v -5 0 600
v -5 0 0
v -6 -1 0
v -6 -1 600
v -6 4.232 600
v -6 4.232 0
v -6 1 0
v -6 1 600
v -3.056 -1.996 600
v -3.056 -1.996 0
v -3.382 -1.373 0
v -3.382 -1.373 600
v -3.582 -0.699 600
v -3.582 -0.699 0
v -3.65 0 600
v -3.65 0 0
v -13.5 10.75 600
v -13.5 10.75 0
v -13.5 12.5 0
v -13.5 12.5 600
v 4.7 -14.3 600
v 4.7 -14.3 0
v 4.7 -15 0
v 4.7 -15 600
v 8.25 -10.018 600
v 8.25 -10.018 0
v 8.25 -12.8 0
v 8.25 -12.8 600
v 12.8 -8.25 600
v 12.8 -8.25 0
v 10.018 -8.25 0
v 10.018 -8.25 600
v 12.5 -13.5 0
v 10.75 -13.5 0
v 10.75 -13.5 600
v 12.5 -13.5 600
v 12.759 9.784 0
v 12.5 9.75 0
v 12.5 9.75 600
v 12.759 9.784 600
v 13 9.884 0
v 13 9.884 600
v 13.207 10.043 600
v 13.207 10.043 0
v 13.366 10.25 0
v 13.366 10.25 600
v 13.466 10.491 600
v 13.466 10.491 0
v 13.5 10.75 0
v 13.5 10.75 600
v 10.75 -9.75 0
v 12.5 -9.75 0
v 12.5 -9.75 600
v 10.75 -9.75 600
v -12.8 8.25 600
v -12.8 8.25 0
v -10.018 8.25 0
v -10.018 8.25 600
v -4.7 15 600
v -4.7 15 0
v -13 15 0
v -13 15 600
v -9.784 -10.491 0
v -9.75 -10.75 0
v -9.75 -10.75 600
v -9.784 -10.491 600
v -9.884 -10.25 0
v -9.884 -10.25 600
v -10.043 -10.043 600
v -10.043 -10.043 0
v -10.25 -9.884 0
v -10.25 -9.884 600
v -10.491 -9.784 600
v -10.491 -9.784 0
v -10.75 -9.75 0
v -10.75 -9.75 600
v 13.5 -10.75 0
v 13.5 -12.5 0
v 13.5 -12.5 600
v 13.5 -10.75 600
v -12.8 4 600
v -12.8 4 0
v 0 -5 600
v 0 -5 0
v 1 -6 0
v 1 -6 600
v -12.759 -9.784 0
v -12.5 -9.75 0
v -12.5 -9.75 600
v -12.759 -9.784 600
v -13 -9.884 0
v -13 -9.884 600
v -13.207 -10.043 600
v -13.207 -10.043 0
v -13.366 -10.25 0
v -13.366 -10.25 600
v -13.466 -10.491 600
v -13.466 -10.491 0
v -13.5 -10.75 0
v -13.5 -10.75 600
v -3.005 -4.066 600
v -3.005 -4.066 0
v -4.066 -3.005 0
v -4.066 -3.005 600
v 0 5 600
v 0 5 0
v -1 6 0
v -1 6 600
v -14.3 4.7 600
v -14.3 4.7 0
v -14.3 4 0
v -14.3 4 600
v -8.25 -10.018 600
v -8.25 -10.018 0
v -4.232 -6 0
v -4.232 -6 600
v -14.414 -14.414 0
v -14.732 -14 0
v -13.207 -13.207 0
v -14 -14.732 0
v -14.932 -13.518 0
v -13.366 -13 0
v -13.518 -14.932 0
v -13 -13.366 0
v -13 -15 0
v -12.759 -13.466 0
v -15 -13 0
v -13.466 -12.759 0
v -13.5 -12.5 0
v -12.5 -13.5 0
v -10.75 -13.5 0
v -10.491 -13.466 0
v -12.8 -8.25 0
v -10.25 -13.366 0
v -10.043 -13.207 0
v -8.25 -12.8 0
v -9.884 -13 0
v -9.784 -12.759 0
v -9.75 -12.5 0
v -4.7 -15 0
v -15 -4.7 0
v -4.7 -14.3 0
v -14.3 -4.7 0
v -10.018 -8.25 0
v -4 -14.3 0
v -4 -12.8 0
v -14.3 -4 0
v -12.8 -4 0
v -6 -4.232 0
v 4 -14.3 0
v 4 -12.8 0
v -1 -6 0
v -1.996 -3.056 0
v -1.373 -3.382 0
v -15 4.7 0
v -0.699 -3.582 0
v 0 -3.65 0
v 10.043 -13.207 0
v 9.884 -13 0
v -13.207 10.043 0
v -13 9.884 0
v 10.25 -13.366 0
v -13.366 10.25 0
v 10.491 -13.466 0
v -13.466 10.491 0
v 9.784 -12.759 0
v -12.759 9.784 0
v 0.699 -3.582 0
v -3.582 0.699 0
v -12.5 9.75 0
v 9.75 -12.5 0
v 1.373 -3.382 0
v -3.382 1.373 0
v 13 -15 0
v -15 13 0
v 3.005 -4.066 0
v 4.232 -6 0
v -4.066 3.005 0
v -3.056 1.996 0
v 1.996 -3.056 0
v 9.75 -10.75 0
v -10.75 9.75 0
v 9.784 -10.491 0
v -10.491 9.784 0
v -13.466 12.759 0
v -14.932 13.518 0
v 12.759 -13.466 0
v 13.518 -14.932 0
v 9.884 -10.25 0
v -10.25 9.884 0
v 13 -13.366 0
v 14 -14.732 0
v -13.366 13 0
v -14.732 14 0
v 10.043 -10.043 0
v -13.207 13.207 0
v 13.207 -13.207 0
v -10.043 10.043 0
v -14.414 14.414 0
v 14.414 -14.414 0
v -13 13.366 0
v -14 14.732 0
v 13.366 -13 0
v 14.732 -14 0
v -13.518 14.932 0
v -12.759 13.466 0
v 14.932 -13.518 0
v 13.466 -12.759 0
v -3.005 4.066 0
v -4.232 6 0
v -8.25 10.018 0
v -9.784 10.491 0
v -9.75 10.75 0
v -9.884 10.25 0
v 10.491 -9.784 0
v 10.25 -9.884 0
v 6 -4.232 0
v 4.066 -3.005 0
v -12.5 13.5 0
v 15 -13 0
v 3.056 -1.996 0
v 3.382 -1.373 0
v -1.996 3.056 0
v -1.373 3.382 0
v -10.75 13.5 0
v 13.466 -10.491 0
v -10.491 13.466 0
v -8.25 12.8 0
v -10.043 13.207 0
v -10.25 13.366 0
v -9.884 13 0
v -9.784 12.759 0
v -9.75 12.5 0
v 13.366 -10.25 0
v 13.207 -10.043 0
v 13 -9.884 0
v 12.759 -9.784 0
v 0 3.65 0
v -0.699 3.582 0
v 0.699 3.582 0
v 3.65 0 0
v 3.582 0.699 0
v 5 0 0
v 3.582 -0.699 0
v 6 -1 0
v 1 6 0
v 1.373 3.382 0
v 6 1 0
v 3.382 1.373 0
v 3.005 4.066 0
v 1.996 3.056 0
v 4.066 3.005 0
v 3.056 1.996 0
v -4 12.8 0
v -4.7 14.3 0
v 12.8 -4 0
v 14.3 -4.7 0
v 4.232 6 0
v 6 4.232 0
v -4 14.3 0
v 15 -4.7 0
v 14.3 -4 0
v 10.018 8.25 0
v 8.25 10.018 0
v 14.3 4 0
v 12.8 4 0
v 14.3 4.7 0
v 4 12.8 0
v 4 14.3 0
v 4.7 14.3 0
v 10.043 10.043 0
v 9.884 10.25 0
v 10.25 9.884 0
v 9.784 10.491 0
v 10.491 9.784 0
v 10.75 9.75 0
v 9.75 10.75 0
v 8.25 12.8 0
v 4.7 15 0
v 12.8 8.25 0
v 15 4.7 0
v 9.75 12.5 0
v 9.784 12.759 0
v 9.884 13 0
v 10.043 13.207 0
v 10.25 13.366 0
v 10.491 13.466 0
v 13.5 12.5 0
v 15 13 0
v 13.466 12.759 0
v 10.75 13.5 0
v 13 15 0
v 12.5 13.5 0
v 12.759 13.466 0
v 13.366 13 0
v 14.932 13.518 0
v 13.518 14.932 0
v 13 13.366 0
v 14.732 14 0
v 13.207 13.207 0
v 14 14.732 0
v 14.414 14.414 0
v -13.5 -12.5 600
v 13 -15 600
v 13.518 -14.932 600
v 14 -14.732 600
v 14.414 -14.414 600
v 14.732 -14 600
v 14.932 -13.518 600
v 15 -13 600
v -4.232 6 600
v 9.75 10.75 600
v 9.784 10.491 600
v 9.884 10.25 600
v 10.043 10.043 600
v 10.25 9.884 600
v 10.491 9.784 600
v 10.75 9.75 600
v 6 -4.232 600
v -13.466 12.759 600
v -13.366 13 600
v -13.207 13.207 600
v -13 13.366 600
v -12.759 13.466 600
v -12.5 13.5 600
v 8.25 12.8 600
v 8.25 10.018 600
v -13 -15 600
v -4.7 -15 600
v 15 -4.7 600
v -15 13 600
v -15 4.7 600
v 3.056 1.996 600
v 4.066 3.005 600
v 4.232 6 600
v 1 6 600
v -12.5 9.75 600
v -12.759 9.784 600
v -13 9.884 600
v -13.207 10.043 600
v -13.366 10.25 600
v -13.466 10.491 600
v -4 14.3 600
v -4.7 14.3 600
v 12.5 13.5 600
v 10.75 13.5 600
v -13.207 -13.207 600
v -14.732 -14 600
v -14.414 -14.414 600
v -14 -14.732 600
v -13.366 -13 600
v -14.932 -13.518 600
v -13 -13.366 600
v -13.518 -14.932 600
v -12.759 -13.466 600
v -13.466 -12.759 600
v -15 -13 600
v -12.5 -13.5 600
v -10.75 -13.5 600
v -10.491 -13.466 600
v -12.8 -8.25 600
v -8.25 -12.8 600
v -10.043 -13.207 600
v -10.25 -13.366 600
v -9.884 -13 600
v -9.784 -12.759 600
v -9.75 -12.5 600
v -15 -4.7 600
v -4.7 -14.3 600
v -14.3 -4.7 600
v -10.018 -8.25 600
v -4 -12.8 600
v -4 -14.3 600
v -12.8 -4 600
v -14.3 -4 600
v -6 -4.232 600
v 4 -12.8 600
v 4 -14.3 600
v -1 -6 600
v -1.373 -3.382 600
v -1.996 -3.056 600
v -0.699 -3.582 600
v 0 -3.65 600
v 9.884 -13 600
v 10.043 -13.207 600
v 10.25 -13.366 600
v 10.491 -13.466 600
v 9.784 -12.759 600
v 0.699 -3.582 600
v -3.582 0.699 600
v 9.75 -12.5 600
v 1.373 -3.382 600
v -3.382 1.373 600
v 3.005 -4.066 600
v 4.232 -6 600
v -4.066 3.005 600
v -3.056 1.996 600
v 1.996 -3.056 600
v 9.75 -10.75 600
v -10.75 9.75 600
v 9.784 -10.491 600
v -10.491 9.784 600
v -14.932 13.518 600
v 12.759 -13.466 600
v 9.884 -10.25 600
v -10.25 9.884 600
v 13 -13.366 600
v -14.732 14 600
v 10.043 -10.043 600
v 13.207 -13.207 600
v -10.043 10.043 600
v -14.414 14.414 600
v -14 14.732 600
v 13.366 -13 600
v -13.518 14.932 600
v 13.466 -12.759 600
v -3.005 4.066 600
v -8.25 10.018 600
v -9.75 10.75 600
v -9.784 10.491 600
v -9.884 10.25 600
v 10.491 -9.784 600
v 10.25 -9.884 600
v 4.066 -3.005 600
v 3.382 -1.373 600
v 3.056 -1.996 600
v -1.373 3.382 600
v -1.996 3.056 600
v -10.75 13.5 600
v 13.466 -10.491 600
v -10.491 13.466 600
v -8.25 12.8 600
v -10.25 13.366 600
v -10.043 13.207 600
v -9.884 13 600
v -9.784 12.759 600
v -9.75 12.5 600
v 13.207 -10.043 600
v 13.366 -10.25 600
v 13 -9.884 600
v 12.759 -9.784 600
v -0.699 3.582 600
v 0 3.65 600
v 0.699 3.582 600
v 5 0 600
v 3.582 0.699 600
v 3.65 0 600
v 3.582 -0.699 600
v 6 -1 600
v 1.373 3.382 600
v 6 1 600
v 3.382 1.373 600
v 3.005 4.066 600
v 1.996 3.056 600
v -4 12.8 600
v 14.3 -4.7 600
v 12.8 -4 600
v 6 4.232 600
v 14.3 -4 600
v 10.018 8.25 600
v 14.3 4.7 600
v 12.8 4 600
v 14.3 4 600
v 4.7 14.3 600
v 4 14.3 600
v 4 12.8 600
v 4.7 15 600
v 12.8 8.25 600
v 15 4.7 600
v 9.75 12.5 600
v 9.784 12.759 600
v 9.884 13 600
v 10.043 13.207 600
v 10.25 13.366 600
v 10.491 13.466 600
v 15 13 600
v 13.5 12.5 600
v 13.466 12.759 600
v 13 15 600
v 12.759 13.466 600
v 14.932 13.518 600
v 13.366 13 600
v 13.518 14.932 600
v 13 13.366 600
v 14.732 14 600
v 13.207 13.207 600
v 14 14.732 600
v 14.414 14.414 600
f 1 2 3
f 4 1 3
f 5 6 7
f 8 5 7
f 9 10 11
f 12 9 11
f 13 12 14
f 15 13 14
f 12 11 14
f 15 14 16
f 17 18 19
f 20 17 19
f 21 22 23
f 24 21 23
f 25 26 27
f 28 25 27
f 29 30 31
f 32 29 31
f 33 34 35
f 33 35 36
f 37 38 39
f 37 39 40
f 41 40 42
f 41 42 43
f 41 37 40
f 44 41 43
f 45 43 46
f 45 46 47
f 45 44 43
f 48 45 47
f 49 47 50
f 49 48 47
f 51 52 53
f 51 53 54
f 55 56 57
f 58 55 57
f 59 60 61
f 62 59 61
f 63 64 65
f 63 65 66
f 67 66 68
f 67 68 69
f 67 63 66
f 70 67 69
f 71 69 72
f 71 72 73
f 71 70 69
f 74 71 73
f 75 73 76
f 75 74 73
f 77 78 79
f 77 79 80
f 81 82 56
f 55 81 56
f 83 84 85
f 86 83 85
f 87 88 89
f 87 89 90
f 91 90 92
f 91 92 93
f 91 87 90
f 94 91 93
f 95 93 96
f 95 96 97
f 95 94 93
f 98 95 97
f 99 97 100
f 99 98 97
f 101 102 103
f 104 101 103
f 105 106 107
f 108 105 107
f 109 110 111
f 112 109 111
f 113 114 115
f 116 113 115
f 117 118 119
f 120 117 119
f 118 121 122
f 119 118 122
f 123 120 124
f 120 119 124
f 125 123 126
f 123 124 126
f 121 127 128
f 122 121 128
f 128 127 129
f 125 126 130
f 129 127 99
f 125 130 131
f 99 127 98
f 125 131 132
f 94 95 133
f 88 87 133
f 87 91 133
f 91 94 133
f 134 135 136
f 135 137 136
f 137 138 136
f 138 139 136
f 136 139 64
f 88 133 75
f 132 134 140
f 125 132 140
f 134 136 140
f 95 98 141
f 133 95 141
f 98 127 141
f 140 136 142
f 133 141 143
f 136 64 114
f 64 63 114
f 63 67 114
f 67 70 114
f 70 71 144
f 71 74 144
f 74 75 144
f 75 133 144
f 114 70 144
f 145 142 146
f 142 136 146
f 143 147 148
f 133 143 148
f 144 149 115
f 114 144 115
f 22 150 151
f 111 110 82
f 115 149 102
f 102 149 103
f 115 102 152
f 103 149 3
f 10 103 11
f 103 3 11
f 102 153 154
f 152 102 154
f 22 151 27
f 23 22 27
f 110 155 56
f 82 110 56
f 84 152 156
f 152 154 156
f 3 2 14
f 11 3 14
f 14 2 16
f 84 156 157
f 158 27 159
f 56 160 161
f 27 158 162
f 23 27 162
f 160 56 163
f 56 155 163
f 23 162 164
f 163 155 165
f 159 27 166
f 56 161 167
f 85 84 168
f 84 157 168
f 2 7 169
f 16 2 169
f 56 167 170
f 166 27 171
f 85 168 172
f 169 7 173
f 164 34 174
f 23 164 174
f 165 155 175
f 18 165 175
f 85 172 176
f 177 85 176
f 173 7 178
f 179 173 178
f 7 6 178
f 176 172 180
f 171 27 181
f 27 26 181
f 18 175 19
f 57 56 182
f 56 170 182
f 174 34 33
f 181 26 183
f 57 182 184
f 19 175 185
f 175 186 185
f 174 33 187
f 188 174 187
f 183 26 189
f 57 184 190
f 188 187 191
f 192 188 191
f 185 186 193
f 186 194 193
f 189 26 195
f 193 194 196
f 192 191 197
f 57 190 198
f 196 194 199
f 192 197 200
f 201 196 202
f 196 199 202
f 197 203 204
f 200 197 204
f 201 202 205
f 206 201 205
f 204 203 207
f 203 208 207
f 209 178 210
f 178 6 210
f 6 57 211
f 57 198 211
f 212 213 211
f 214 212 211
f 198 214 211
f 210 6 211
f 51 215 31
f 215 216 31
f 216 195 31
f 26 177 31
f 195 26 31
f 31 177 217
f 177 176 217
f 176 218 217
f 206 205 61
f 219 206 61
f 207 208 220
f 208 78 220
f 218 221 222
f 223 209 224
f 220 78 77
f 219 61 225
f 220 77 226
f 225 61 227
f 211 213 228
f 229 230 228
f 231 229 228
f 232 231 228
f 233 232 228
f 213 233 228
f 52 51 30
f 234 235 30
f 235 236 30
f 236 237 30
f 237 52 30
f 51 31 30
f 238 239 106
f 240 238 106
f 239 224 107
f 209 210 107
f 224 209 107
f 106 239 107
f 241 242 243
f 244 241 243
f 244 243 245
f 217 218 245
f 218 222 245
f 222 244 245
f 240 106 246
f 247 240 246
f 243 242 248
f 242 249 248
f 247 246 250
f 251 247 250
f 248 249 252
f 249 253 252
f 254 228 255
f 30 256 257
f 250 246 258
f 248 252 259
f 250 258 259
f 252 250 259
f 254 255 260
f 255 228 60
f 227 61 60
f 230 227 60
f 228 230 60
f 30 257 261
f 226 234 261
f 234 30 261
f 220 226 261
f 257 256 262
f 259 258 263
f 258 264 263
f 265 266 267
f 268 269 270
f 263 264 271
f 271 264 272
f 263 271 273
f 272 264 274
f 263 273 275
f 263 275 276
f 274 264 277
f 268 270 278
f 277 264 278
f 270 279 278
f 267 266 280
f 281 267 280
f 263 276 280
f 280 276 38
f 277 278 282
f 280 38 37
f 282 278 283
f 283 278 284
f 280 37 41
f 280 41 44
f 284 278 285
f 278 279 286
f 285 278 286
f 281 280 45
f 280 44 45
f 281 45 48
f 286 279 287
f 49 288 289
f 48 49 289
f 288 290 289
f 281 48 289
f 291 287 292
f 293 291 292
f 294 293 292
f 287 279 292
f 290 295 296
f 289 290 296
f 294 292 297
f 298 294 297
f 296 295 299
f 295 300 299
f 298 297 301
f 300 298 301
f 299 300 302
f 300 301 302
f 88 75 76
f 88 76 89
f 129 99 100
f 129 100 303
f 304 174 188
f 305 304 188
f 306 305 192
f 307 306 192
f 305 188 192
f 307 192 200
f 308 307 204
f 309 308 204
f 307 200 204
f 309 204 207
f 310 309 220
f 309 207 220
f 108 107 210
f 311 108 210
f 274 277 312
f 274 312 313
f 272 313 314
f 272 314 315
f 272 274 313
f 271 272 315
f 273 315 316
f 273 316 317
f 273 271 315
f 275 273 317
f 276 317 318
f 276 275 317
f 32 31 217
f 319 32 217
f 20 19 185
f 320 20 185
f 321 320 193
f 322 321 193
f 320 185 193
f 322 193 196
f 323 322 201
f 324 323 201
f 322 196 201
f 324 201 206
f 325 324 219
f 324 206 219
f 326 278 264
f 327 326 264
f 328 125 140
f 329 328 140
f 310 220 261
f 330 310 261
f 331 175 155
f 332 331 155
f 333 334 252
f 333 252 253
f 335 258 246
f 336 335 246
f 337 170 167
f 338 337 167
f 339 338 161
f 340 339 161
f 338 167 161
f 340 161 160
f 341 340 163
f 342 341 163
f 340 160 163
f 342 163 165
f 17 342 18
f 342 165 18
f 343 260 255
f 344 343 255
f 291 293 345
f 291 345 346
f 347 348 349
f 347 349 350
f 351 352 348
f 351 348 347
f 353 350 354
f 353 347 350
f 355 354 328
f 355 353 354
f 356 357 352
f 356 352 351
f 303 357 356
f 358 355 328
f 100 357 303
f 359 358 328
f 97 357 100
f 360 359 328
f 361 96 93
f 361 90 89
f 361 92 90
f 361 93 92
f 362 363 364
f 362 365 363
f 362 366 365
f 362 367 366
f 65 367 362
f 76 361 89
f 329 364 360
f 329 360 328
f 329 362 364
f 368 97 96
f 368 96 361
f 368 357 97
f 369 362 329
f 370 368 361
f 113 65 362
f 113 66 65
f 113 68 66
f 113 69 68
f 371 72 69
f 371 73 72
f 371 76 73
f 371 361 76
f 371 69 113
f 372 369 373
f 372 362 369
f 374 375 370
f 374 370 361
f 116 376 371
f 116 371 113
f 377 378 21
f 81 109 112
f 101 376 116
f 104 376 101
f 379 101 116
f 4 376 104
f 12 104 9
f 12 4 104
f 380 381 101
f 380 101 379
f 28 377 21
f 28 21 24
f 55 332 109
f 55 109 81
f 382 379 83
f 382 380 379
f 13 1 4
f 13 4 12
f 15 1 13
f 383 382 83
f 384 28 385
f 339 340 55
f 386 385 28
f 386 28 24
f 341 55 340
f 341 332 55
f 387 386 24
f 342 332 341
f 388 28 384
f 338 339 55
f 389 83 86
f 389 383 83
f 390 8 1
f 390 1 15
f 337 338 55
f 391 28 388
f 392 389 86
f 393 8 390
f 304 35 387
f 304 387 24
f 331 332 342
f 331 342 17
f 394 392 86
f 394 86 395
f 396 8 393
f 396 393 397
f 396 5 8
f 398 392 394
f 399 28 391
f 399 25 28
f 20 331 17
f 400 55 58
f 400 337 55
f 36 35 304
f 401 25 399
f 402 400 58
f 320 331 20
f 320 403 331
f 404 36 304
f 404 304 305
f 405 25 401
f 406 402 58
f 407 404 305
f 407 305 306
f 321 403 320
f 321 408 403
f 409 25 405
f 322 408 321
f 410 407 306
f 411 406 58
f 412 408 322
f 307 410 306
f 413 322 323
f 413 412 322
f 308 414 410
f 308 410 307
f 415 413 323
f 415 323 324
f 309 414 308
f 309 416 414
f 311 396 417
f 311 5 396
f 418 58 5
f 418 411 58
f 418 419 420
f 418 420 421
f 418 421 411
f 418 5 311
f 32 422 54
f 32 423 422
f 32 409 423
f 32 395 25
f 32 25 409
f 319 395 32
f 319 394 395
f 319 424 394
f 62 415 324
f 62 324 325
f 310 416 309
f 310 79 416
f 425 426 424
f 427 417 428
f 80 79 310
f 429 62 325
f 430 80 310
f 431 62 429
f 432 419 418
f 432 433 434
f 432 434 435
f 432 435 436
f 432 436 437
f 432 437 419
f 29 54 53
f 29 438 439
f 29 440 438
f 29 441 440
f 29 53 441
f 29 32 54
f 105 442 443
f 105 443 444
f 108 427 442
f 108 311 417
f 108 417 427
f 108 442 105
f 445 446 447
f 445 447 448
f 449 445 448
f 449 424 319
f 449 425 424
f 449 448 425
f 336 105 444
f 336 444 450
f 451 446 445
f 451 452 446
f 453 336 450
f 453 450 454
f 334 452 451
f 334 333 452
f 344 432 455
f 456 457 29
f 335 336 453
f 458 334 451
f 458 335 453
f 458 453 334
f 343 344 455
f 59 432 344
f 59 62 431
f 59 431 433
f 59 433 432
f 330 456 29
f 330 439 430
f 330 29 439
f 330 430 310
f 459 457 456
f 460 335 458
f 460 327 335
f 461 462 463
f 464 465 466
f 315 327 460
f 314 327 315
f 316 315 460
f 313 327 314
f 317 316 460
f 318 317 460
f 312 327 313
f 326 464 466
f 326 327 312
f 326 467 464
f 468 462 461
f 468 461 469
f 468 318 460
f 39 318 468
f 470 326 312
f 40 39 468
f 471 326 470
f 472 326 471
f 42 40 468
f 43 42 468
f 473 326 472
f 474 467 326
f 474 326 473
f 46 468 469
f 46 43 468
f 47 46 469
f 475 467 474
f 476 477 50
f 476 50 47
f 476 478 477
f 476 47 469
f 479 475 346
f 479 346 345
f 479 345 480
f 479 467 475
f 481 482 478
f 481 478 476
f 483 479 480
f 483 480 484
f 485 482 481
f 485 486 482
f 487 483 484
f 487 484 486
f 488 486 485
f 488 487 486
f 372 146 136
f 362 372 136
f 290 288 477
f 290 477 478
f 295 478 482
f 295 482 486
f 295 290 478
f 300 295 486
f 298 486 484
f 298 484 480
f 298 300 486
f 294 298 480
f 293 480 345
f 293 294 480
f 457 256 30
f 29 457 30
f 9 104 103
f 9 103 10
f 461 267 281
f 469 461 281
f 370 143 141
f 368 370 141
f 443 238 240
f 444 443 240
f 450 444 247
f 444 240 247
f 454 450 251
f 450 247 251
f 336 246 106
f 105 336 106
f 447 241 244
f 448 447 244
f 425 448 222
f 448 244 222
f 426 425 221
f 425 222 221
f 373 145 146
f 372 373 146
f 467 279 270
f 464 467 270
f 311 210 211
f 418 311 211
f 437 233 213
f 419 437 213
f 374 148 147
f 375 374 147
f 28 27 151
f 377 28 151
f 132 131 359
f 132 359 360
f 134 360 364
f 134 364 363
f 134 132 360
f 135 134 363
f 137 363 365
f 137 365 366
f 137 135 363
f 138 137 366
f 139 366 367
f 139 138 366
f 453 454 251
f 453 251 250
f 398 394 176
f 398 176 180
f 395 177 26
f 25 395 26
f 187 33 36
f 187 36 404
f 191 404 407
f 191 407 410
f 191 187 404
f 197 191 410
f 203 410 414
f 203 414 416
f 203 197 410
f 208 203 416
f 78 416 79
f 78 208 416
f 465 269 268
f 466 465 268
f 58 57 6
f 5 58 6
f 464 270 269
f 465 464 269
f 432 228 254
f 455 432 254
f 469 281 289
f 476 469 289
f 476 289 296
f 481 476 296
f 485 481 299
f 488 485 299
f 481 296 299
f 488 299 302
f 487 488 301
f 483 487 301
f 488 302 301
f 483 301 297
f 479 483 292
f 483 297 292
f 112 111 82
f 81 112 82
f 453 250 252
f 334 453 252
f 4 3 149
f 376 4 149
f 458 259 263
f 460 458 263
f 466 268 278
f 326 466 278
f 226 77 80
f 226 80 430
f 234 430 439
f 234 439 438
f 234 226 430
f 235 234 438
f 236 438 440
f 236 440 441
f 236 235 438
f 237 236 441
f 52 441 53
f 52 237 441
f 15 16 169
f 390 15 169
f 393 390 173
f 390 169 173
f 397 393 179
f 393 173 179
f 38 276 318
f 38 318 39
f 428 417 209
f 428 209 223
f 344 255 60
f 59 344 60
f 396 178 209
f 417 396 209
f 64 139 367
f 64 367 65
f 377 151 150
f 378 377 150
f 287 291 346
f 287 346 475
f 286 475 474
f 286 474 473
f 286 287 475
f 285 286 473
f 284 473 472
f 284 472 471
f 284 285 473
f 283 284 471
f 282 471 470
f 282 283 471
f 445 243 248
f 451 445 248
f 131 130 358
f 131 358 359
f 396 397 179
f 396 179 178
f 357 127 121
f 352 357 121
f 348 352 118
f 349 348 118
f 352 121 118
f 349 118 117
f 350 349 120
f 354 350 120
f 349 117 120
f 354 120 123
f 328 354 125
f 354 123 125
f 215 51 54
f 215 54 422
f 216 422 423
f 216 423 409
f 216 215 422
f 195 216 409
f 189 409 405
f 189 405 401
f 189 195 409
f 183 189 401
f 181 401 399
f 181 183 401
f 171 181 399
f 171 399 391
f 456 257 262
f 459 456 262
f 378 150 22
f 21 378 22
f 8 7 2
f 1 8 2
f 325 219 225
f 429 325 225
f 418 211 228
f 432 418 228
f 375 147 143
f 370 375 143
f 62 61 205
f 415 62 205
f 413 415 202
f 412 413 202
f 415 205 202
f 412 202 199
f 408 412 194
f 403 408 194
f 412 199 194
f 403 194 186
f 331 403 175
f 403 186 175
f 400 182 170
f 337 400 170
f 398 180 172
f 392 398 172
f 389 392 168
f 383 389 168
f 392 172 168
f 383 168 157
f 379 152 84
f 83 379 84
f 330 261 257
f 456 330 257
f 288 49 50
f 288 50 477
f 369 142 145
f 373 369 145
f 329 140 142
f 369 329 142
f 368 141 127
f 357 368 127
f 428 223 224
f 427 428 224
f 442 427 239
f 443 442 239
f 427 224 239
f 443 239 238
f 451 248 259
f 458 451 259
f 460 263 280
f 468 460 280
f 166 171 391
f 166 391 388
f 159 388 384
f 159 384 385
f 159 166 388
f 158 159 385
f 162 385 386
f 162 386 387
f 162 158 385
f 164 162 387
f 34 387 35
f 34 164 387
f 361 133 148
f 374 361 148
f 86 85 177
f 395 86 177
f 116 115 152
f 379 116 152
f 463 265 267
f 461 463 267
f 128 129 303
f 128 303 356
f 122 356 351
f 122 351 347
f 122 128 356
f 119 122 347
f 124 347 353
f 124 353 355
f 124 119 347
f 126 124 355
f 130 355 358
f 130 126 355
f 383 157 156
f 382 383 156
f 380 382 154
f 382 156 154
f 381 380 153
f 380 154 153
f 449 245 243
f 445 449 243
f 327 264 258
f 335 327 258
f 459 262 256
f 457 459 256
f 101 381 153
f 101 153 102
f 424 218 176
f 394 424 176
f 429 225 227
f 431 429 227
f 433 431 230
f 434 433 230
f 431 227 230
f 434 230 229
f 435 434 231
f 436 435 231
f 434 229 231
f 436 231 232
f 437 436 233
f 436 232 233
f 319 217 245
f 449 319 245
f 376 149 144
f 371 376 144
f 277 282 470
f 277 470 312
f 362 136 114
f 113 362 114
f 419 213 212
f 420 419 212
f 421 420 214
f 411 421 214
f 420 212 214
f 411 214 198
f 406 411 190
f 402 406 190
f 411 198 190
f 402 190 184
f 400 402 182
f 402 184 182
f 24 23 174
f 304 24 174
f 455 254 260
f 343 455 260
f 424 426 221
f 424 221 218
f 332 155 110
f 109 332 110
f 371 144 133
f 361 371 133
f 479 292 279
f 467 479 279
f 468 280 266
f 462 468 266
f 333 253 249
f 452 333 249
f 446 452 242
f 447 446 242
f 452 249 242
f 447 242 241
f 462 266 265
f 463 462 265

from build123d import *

# Parameters (mm, degrees)
ESTRUSIONE_ESTRUSIONE2_DEPTH = 600


with BuildPart() as part:
    # Schizzo1 → Estrusione-Estrusione2 (new body)
    with BuildSketch(Plane.XY):
        with BuildLine():
            Line((-15, 13), (-15, 4.7))
            Line((-15, 4.7), (-14.3, 4.7))
            Line((-14.3, 4.7), (-14.3, 4))
            Line((-14.3, 4), (-12.8, 4))
            Line((-12.8, 4), (-12.8, 8.25))
            Line((-12.8, 8.25), (-10.017766953, 8.25))
            Line((-10.017766953, 8.25), (-6, 4.232233047))
            Line((-6, 4.232233047), (-6, 1))
            Line((-6, 1), (-5, 0))
            Line((-5, 0), (-6, -1))
            Line((-6, -1), (-6, -4.232233047))
            Line((-6, -4.232233047), (-10.017766953, -8.25))
            Line((-10.017766953, -8.25), (-12.8, -8.25))
            Line((-12.8, -8.25), (-12.8, -4))
            Line((-12.8, -4), (-14.3, -4))
            Line((-14.3, -4), (-14.3, -4.7))
            Line((-14.3, -4.7), (-15, -4.7))
            Line((-15, -4.7), (-15, -13))
            ThreePointArc((-15, -13), (-14.414213562, -14.414213562), (-13, -15))
            Line((-13, -15), (-4.7, -15))
            Line((-4.7, -15), (-4.7, -14.3))
            Line((-4.7, -14.3), (-4, -14.3))
            Line((-4, -14.3), (-4, -12.8))
            Line((-4, -12.8), (-8.25, -12.8))
            Line((-8.25, -12.8), (-8.25, -10.017766953))
            Line((-8.25, -10.017766953), (-4.232233047, -6))
            Line((-4.232233047, -6), (-1, -6))
            Line((-1, -6), (0, -5))
            Line((0, -5), (1, -6))
            Line((1, -6), (4.232233047, -6))
            Line((4.232233047, -6), (8.25, -10.017766953))
            Line((8.25, -10.017766953), (8.25, -12.8))
            Line((8.25, -12.8), (4, -12.8))
            Line((4, -12.8), (4, -14.3))
            Line((4, -14.3), (4.7, -14.3))
            Line((4.7, -14.3), (4.7, -15))
            Line((4.7, -15), (13, -15))
            ThreePointArc((13, -15), (14.414213562, -14.414213562), (15, -13))
            Line((15, -13), (15, -4.7))
            Line((15, -4.7), (14.3, -4.7))
            Line((14.3, -4.7), (14.3, -4))
            Line((14.3, -4), (12.8, -4))
            Line((12.8, -4), (12.8, -8.25))
            Line((12.8, -8.25), (10.017766953, -8.25))
            Line((10.017766953, -8.25), (6, -4.232233047))
            Line((6, -4.232233047), (6, -1))
            Line((6, -1), (5, 0))
            Line((5, 0), (6, 1))
            Line((6, 1), (6, 4.232233047))
            Line((6, 4.232233047), (10.017766953, 8.25))
            Line((10.017766953, 8.25), (12.8, 8.25))
            Line((12.8, 8.25), (12.8, 4))
            Line((12.8, 4), (14.3, 4))
            Line((14.3, 4), (14.3, 4.7))
            Line((14.3, 4.7), (15, 4.7))
            Line((15, 4.7), (15, 13))
            ThreePointArc((15, 13), (14.414213562, 14.414213562), (13, 15))
            Line((13, 15), (4.7, 15))
            Line((4.7, 15), (4.7, 14.3))
            Line((4.7, 14.3), (4, 14.3))
            Line((4, 14.3), (4, 12.8))
            Line((4, 12.8), (8.25, 12.8))
            Line((8.25, 12.8), (8.25, 10.017766953))
            Line((8.25, 10.017766953), (4.232233047, 6))
            Line((4.232233047, 6), (1, 6))
            Line((1, 6), (0, 5))
            Line((0, 5), (-1, 6))
            Line((-1, 6), (-4.232233047, 6))
            Line((-4.232233047, 6), (-8.25, 10.017766953))
            Line((-8.25, 10.017766953), (-8.25, 12.8))
            Line((-8.25, 12.8), (-4, 12.8))
            Line((-4, 12.8), (-4, 14.3))
            Line((-4, 14.3), (-4.7, 14.3))
            Line((-4.7, 14.3), (-4.7, 15))
            Line((-4.7, 15), (-13, 15))
            ThreePointArc((-13, 15), (-14.414213562, 14.414213562), (-15, 13))
        make_face()
        with BuildLine():
            Line((13.5, 10.75), (13.5, 12.5))
            ThreePointArc((13.5, 12.5), (13.207106781, 13.207106781), (12.5, 13.5))
            Line((12.5, 13.5), (10.75, 13.5))
            ThreePointArc((10.75, 13.5), (10.042893219, 13.207106781), (9.75, 12.5))
            Line((9.75, 12.5), (9.75, 10.75))
            ThreePointArc((9.75, 10.75), (10.042893219, 10.042893219), (10.75, 9.75))
            Line((10.75, 9.75), (12.5, 9.75))
            ThreePointArc((12.5, 9.75), (13.207106781, 10.042893219), (13.5, 10.75))
        make_face(mode=Mode.SUBTRACT)
        with BuildLine():
            Line((10.75, -13.5), (12.5, -13.5))
            ThreePointArc((12.5, -13.5), (13.207106781, -13.207106781), (13.5, -12.5))
            Line((13.5, -12.5), (13.5, -10.75))
            ThreePointArc((13.5, -10.75), (13.207106781, -10.042893219), (12.5, -9.75))
            Line((12.5, -9.75), (10.75, -9.75))
            ThreePointArc((10.75, -9.75), (10.042893219, -10.042893219), (9.75, -10.75))
            Line((9.75, -10.75), (9.75, -12.5))
            ThreePointArc((9.75, -12.5), (10.042893219, -13.207106781), (10.75, -13.5))
        make_face(mode=Mode.SUBTRACT)
        with BuildLine():
            Line((-13.5, -10.75), (-13.5, -12.5))
            ThreePointArc((-13.5, -12.5), (-13.207106781, -13.207106781), (-12.5, -13.5))
            Line((-12.5, -13.5), (-10.75, -13.5))
            ThreePointArc((-10.75, -13.5), (-10.042893219, -13.207106781), (-9.75, -12.5))
            Line((-9.75, -12.5), (-9.75, -10.75))
            ThreePointArc((-9.75, -10.75), (-10.042893219, -10.042893219), (-10.75, -9.75))
            Line((-10.75, -9.75), (-12.5, -9.75))
            ThreePointArc((-12.5, -9.75), (-13.207106781, -10.042893219), (-13.5, -10.75))
        make_face(mode=Mode.SUBTRACT)
        with BuildLine():
            Line((1.995536102, 3.056196274), (3.00520382, 4.065863992))
            Line((3.00520382, 4.065863992), (4.065863992, 3.00520382))
            Line((4.065863992, 3.00520382), (3.056196274, 1.995536102))
            ThreePointArc((3.056196274, 1.995536102), (3.498400806, 1.041005187), (3.65, 0))
            ThreePointArc((3.65, 0), (3.498400806, -1.041005187), (3.056196274, -1.995536102))
            Line((3.056196274, -1.995536102), (4.065863992, -3.00520382))
            Line((4.065863992, -3.00520382), (3.00520382, -4.065863992))
            Line((3.00520382, -4.065863992), (1.995536102, -3.056196274))
            ThreePointArc((1.995536102, -3.056196274), (1.041005187, -3.498400806), (0, -3.65))
            ThreePointArc((0, -3.65), (-1.041005187, -3.498400806), (-1.995536102, -3.056196274))
            Line((-1.995536102, -3.056196274), (-3.00520382, -4.065863992))
            Line((-3.00520382, -4.065863992), (-4.065863992, -3.00520382))
            Line((-4.065863992, -3.00520382), (-3.056196274, -1.995536102))
            ThreePointArc((-3.056196274, -1.995536102), (-3.498400806, -1.041005187), (-3.65, 0))
            ThreePointArc((-3.65, 0), (-3.498400806, 1.041005187), (-3.056196274, 1.995536102))
            Line((-3.056196274, 1.995536102), (-4.065863992, 3.00520382))
            Line((-4.065863992, 3.00520382), (-3.00520382, 4.065863992))
            Line((-3.00520382, 4.065863992), (-1.995536102, 3.056196274))
            ThreePointArc((-1.995536102, 3.056196274), (-1.041005187, 3.498400806), (0, 3.65))
            ThreePointArc((0, 3.65), (1.041005187, 3.498400806), (1.995536102, 3.056196274))
        make_face(mode=Mode.SUBTRACT)
        with BuildLine():
            Line((-10.75, 9.75), (-12.5, 9.75))
            ThreePointArc((-12.5, 9.75), (-13.207106781, 10.042893219), (-13.5, 10.75))
            Line((-13.5, 10.75), (-13.5, 12.5))
            ThreePointArc((-13.5, 12.5), (-13.207106781, 13.207106781), (-12.5, 13.5))
            Line((-12.5, 13.5), (-10.75, 13.5))
            ThreePointArc((-10.75, 13.5), (-10.042893219, 13.207106781), (-9.75, 12.5))
            Line((-9.75, 12.5), (-9.75, 10.75))
            ThreePointArc((-9.75, 10.75), (-10.042893219, 10.042893219), (-10.75, 9.75))
        make_face(mode=Mode.SUBTRACT)
    extrude(amount=ESTRUSIONE_ESTRUSIONE2_DEPTH)


solid = part.part
